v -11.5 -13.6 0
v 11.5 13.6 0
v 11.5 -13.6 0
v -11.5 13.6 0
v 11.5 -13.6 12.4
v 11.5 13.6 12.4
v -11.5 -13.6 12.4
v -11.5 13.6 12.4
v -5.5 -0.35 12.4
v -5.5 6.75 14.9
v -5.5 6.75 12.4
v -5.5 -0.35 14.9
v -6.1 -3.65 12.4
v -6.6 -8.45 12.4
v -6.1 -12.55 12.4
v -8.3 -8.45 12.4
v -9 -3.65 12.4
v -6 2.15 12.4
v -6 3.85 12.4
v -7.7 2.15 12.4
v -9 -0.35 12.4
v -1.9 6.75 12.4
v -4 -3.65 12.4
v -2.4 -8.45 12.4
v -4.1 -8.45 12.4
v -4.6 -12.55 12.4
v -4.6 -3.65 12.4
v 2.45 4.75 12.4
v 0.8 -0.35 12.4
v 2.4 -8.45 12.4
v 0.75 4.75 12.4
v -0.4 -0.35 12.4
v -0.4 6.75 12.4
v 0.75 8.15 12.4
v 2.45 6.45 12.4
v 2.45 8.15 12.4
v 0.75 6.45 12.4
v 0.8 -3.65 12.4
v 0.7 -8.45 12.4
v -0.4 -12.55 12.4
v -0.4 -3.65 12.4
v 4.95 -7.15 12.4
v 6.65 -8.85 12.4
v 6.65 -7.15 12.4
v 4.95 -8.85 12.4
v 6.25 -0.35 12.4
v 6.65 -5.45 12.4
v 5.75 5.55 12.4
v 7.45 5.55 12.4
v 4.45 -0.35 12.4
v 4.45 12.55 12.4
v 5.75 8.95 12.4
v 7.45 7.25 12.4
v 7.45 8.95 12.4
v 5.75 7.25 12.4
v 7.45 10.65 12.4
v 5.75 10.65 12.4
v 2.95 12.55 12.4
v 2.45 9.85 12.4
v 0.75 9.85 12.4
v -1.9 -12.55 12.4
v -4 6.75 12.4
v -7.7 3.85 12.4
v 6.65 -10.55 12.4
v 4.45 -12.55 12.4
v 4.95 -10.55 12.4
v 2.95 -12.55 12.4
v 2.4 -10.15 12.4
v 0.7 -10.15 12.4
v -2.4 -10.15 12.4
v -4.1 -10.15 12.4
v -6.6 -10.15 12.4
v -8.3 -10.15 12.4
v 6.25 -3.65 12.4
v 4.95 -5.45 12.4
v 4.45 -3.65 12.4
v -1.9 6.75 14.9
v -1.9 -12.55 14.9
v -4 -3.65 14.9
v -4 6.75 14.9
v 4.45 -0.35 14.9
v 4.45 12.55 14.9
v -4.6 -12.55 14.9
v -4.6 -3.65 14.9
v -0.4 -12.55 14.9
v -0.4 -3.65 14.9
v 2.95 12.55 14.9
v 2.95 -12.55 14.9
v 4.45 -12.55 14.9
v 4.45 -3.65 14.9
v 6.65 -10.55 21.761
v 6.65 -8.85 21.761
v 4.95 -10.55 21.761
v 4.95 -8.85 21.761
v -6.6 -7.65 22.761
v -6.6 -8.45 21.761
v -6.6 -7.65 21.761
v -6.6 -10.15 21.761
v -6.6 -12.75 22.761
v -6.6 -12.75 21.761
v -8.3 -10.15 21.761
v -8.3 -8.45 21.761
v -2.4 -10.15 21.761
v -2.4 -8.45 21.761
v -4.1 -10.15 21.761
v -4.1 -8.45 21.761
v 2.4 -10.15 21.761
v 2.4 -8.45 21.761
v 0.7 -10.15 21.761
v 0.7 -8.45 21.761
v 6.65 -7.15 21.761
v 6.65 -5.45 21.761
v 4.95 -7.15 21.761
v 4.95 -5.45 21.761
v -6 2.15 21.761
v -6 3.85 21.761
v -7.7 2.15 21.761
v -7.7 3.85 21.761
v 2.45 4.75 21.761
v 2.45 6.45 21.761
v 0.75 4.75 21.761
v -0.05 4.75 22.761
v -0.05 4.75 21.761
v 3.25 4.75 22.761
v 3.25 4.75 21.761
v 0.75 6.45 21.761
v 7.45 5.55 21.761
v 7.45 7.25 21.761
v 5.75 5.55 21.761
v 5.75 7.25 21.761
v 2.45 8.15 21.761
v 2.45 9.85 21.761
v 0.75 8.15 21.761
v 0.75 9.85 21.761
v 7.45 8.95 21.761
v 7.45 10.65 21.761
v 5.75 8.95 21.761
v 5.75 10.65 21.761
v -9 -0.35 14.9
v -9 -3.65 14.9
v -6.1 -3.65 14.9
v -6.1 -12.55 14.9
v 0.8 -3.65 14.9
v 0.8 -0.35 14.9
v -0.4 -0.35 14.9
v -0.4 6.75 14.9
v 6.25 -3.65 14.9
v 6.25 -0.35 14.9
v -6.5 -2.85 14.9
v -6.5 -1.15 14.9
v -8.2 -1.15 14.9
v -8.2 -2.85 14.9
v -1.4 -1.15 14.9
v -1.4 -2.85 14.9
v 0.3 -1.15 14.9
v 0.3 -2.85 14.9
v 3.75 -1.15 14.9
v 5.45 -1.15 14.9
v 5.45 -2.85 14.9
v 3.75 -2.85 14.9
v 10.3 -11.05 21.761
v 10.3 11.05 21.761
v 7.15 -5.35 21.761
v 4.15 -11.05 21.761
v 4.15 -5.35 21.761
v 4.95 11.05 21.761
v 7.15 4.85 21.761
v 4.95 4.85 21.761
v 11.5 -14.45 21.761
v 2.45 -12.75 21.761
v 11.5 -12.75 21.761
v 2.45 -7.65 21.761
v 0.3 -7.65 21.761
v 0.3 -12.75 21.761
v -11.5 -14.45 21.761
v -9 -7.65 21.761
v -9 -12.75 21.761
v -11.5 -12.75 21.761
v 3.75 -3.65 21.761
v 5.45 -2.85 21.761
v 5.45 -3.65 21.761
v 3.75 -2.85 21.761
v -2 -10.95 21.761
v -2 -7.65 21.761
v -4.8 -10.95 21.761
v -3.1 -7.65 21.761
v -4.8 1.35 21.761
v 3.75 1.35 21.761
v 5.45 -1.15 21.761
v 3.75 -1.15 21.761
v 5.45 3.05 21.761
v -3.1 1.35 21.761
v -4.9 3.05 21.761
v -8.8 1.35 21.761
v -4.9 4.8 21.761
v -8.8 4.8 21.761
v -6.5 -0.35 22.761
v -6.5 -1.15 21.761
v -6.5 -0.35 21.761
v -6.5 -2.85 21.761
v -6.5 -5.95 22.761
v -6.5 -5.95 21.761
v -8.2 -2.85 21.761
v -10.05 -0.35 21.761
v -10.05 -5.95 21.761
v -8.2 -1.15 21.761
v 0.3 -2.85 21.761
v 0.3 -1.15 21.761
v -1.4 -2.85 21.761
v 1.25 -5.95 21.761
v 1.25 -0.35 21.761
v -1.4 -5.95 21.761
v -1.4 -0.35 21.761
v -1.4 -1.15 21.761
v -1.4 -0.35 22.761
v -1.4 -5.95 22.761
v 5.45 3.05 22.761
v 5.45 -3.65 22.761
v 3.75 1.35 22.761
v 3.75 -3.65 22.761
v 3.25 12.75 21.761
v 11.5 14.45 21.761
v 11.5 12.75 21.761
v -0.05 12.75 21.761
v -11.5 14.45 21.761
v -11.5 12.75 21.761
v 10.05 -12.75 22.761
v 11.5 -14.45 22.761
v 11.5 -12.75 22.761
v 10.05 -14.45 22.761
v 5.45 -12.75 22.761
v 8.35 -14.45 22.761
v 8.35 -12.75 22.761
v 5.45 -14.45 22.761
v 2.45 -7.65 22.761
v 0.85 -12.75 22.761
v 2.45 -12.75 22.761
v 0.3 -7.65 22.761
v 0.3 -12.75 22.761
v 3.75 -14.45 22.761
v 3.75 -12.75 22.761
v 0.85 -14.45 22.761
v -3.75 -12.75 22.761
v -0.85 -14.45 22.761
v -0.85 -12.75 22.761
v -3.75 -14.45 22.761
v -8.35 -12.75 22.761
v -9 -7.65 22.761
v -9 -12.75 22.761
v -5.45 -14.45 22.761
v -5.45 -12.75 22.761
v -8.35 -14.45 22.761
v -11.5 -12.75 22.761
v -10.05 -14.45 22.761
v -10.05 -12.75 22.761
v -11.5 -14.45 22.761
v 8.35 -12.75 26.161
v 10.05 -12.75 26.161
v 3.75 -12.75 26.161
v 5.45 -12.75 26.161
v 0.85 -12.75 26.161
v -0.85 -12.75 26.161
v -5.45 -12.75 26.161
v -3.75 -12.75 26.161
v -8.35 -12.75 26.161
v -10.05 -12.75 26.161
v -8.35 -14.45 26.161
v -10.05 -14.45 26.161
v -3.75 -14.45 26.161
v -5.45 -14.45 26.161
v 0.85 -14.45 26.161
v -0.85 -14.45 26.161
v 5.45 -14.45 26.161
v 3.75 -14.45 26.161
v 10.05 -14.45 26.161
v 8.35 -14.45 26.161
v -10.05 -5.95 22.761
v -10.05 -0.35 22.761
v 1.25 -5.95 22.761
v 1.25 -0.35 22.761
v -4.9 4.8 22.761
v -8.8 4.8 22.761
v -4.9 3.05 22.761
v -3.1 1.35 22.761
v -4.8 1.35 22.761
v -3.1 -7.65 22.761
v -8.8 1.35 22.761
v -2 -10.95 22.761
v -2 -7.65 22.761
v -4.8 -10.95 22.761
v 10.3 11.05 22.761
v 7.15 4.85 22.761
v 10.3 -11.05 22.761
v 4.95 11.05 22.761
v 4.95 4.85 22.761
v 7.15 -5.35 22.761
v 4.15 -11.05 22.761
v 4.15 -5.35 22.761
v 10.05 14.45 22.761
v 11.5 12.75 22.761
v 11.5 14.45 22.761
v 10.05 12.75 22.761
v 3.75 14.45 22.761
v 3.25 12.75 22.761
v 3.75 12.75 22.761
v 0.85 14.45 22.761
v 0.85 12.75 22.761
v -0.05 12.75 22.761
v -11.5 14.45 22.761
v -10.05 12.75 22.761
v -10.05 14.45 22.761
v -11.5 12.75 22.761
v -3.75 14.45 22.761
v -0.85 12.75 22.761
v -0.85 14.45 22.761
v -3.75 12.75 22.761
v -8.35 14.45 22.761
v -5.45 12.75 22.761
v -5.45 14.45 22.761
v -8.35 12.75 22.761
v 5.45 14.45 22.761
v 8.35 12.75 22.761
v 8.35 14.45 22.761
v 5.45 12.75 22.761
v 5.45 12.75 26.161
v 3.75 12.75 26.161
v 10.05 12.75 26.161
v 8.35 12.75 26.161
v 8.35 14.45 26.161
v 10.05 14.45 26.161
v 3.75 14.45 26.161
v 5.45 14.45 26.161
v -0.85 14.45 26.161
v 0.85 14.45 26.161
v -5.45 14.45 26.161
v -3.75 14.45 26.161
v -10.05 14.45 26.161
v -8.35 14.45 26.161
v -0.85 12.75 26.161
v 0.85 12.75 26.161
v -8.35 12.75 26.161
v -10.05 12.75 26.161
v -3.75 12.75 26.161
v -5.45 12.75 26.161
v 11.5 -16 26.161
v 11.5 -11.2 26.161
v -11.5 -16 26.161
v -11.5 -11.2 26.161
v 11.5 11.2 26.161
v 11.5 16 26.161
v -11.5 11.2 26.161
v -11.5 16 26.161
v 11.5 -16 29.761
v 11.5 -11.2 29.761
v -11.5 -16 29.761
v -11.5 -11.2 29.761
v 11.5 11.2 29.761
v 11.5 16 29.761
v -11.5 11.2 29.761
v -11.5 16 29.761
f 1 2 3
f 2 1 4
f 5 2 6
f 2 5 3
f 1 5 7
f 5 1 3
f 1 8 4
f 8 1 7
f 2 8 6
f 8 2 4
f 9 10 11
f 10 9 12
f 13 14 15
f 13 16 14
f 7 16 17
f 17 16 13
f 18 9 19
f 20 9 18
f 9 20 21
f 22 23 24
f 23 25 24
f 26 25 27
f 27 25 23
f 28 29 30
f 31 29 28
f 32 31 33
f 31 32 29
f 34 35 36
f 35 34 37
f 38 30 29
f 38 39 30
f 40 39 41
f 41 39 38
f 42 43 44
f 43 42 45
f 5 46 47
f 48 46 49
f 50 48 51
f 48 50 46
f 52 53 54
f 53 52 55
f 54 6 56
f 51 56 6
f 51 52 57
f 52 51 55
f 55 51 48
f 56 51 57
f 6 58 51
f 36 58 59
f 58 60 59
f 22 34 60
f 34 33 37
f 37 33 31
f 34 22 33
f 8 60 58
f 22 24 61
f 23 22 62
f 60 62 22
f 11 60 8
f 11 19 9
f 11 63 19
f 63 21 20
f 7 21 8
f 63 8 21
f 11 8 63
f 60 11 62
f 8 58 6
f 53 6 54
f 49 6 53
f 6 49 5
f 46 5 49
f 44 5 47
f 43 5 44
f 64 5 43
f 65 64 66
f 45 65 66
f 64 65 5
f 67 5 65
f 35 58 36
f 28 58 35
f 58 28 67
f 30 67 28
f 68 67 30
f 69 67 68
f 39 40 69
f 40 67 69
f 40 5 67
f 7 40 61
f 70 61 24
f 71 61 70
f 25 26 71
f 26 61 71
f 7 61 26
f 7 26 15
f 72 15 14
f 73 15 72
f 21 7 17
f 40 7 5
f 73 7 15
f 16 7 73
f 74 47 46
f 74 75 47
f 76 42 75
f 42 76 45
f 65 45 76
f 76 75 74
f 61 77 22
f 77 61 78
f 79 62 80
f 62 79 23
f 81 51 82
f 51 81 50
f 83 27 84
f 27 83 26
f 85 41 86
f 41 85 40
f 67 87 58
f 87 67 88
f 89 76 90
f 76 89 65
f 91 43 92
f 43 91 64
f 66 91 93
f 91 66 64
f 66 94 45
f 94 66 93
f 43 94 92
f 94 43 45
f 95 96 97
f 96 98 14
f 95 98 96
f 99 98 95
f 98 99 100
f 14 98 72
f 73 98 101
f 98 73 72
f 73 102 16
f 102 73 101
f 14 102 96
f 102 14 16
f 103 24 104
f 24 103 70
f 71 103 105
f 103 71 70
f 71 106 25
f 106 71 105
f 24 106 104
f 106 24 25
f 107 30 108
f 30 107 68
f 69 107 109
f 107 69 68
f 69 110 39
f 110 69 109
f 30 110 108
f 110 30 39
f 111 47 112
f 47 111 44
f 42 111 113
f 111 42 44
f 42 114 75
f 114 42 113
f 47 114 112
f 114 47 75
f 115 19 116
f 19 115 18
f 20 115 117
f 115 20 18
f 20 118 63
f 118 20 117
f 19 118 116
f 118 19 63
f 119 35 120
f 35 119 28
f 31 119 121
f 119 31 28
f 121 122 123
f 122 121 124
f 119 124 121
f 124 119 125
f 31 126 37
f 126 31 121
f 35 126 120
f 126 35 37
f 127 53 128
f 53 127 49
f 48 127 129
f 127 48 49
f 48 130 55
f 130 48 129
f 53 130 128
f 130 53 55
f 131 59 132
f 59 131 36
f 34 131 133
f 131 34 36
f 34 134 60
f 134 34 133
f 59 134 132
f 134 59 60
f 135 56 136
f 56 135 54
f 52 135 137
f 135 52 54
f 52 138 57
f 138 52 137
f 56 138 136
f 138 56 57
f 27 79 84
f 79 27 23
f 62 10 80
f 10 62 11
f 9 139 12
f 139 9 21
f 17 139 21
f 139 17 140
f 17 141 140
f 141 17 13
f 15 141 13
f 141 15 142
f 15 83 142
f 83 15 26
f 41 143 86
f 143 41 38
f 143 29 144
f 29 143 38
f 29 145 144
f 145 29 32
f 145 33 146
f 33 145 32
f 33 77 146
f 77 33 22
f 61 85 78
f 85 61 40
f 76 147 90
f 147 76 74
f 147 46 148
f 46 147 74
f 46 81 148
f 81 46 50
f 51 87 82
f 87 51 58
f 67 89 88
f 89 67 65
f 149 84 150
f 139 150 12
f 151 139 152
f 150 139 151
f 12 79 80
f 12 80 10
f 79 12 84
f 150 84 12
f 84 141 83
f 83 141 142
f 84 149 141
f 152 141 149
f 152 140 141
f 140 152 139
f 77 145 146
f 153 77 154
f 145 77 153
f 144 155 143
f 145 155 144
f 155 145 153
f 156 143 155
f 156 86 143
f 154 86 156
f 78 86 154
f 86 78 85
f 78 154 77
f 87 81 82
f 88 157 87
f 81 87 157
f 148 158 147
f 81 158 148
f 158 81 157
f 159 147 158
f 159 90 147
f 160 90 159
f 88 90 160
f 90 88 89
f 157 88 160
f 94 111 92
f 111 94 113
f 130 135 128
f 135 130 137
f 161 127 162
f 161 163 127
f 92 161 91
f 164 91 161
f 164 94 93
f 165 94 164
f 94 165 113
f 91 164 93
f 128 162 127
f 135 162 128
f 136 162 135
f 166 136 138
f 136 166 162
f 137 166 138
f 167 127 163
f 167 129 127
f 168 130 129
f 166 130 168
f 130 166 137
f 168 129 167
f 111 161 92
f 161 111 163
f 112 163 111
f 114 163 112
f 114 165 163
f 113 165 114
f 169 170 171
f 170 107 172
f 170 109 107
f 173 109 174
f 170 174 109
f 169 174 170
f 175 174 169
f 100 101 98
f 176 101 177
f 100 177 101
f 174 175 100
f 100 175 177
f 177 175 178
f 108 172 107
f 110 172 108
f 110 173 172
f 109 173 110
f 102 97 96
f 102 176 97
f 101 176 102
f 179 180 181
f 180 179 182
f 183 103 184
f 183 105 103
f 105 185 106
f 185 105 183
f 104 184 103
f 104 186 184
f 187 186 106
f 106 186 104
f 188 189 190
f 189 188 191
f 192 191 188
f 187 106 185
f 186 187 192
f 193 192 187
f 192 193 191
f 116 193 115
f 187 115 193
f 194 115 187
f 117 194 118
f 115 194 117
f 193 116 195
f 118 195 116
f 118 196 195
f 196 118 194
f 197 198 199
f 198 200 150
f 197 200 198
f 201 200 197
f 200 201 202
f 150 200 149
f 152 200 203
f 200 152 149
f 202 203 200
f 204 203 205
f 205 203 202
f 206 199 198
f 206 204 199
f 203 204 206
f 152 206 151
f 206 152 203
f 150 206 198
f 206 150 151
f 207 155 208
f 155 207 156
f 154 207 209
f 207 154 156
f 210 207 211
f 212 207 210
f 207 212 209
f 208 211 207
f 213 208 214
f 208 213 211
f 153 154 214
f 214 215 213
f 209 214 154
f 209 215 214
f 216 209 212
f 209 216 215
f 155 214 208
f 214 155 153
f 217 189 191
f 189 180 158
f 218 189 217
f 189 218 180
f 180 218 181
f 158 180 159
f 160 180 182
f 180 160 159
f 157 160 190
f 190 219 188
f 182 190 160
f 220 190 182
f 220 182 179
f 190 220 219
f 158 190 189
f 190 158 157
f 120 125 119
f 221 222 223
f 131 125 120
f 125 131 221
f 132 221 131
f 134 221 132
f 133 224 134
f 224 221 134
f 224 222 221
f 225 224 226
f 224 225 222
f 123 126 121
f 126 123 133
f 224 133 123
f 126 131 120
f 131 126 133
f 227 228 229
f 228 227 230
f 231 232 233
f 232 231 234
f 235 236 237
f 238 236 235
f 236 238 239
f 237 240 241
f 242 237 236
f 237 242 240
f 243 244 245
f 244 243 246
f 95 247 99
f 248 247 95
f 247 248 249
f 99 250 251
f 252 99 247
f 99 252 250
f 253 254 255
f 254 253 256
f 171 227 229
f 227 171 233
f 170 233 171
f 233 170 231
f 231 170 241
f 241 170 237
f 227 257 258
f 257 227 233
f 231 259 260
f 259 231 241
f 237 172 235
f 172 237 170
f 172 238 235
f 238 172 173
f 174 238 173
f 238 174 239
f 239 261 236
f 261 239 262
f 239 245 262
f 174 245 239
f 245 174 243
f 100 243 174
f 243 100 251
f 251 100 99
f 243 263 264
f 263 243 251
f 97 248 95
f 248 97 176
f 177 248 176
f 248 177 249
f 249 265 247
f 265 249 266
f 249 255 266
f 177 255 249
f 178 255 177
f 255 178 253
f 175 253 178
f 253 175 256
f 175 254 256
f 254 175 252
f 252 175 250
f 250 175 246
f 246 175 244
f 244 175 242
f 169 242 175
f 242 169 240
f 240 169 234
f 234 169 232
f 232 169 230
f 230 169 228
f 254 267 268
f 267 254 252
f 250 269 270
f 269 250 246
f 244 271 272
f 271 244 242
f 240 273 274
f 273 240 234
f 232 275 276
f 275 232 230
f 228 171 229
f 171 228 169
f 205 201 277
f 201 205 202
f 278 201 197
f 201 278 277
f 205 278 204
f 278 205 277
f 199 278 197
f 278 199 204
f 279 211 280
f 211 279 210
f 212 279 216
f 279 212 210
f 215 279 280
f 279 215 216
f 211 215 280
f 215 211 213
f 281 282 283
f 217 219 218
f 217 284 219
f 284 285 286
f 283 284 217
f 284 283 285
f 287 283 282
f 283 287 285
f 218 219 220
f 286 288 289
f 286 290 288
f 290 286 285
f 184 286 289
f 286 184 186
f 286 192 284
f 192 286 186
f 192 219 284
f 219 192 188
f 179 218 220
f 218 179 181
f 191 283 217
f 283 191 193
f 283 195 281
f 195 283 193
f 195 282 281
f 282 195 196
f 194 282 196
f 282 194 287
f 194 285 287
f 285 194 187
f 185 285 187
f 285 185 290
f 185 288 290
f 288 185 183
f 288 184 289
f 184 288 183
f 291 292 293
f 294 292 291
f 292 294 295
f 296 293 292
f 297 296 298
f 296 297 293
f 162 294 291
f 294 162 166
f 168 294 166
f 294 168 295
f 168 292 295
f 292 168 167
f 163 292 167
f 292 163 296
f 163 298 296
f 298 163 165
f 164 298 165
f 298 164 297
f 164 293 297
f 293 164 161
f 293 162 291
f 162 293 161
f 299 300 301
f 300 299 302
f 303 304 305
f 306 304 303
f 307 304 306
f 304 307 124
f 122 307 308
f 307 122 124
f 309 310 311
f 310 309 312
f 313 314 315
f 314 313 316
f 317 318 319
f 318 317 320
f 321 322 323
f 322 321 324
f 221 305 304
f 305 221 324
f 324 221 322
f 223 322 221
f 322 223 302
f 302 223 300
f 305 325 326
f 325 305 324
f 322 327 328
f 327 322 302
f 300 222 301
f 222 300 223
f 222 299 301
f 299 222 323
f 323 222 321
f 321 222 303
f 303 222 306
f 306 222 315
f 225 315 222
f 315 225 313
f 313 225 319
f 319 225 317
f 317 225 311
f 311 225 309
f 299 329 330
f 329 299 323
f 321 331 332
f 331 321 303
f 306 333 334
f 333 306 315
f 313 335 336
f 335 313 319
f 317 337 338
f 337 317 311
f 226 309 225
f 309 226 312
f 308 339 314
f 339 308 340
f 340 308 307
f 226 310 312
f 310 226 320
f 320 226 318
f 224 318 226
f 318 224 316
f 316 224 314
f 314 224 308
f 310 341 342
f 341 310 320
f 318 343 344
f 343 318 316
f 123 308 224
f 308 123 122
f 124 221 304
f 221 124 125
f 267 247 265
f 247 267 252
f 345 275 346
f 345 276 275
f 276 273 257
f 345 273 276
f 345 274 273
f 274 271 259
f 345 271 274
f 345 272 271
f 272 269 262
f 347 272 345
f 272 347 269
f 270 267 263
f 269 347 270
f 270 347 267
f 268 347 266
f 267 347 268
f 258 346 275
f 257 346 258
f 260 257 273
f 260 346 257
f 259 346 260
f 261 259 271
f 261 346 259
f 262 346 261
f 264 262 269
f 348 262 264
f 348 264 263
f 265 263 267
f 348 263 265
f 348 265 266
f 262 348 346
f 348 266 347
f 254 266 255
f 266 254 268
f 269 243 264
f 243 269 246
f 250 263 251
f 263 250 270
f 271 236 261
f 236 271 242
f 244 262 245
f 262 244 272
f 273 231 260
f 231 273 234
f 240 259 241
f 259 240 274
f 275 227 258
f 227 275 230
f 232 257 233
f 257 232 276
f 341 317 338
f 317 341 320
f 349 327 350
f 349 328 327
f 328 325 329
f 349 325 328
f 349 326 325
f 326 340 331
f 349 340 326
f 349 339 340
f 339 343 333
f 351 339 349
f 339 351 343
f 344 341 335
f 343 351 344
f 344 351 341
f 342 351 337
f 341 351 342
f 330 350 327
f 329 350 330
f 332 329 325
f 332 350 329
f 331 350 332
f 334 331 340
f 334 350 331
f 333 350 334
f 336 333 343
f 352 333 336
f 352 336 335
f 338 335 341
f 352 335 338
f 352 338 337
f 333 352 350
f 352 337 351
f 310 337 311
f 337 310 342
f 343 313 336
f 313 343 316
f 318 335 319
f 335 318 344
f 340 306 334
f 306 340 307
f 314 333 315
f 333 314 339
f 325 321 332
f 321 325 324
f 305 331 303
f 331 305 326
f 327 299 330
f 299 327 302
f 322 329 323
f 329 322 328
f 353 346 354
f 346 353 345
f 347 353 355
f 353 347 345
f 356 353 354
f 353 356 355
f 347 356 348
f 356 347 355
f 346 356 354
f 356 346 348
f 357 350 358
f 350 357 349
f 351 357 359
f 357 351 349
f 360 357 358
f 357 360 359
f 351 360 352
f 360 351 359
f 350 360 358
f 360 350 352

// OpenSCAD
// Generated by SolidPython 0.4.2 on 2020-09-29 23:21:08
//!OpenSCAD

scale(v = 0.0100000000) {
	translate(v = [-1150, -1360, 0]) {
		union() {
			color(c = [0.4000000000, 0.4000000000, 0.4000000000]) {
				translate(v = [0, 0, 0]) {
					linear_extrude(height = 1000.0000000000) {
						polygon(paths = [[0, 1, 2, 3]], points = [[0, 0], [0, 2720], [2300, 2720], [2300, 0]]);
					}
				}
			}
			color(c = [0.2000000000, 0.6000000000, 0.2000000000]) {
				translate(v = [0, 0, 1000.0000000000]) {
					linear_extrude(height = 120.0000000000) {
						polygon(paths = [[0, 1, 2, 3]], points = [[0, 1305], [0, 2720], [2300, 2720], [2300, 1305]]);
					}
				}
			}
			color(c = [0.4000000000, 0.4000000000, 0.4000000000]) {
				translate(v = [0, 0, 1000.0000000000]) {
					linear_extrude(height = 120.0000000000) {
						polygon(paths = [[0, 1, 2, 3]], points = [[0, 0], [0, 1305], [2300, 1305], [2300, 0]]);
					}
				}
			}
			color(c = [0.9000000000, 0.6000000000, 0.6000000000]) {
				translate(v = [0, 0, 1120.0000000000]) {
					linear_extrude(height = 120.0000000000) {
						polygon(paths = [[0, 1, 2, 3]], points = [[340, 1485], [340, 1905], [600, 1905], [600, 1485]]);
					}
				}
			}
			color(c = [0.9000000000, 0.6000000000, 0.6000000000]) {
				translate(v = [0, 0, 1120.0000000000]) {
					linear_extrude(height = 120.0000000000) {
						polygon(paths = [[0, 1, 2, 3]], points = [[750, 1485], [750, 1905], [960, 1905], [960, 1485]]);
					}
				}
			}
			color(c = [0.9000000000, 0.6000000000, 0.6000000000]) {
				translate(v = [0, 0, 1120.0000000000]) {
					linear_extrude(height = 120.0000000000) {
						polygon(paths = [[0, 1, 2, 3, 4, 5]], points = [[1110, 1485], [1110, 1905], [1185, 1905], [1185, 2485], [1445, 2485], [1445, 1485]]);
					}
				}
			}
			color(c = [0.9000000000, 0.6000000000, 0.6000000000]) {
				translate(v = [0, 0, 1120.0000000000]) {
					linear_extrude(height = 120.0000000000) {
						polygon(paths = [[0, 1, 2, 3]], points = [[1595, 1485], [1595, 2485], [1935, 2485], [1935, 1485]]);
					}
				}
			}
			color(c = [0.9000000000, 0.6000000000, 0.9000000000]) {
				translate(v = [0, 0, 1120.0000000000]) {
					linear_extrude(height = 120.0000000000) {
						polygon(paths = [[0, 1, 2, 3]], points = [[280, 235], [280, 655], [540, 655], [540, 235]]);
					}
				}
			}
			color(c = [0.9000000000, 0.6000000000, 0.9000000000]) {
				translate(v = [0, 0, 1120.0000000000]) {
					linear_extrude(height = 120.0000000000) {
						polygon(paths = [[0, 1, 2, 3]], points = [[690, 235], [690, 655], [960, 655], [960, 235]]);
					}
				}
			}
			color(c = [0.9000000000, 0.6000000000, 0.9000000000]) {
				translate(v = [0, 0, 1120.0000000000]) {
					linear_extrude(height = 120.0000000000) {
						polygon(paths = [[0, 1, 2, 3, 4, 5]], points = [[1110, 235], [1110, 655], [1185, 655], [1185, 885], [1445, 885], [1445, 235]]);
					}
				}
			}
			color(c = [0.9000000000, 0.6000000000, 0.9000000000]) {
				translate(v = [0, 0, 1120.0000000000]) {
					linear_extrude(height = 120.0000000000) {
						polygon(paths = [[0, 1, 2, 3]], points = [[1595, 235], [1595, 885], [1855, 885], [1855, 235]]);
					}
				}
			}
			color(c = [0.2000000000, 0.6000000000, 0.2000000000]) {
				translate(v = [0, 0, 1120.0000000000]) {
					linear_extrude(height = 120.0000000000) {
						difference() {
							polygon(paths = [[0, 1, 2, 3]], points = [[0, 1305], [0, 2720], [2300, 2720], [2300, 1305]]);
							polygon(paths = [[0, 1, 2, 3]], points = [[340, 1485], [600, 1485], [600, 1905], [340, 1905]]);
							polygon(paths = [[0, 1, 2, 3]], points = [[750, 1485], [960, 1485], [960, 1905], [750, 1905]]);
							polygon(paths = [[0, 1, 2, 3]], points = [[1595, 1485], [1935, 1485], [1935, 2485], [1595, 2485]]);
							polygon(paths = [[0, 1, 2, 3, 4, 5]], points = [[1110, 1485], [1445, 1485], [1445, 2485], [1185, 2485], [1185, 1905], [1110, 1905]]);
						}
					}
				}
			}
			color(c = [0.4000000000, 0.4000000000, 0.4000000000]) {
				translate(v = [0, 0, 1120.0000000000]) {
					linear_extrude(height = 120.0000000000) {
						difference() {
							polygon(paths = [[0, 1, 2, 3]], points = [[0, 0], [0, 1305], [2300, 1305], [2300, 0]]);
							polygon(paths = [[0, 1, 2, 3]], points = [[280, 235], [540, 235], [540, 655], [280, 655]]);
							polygon(paths = [[0, 1, 2, 3]], points = [[690, 235], [960, 235], [960, 655], [690, 655]]);
							polygon(paths = [[0, 1, 2, 3]], points = [[1595, 235], [1855, 235], [1855, 885], [1595, 885]]);
							polygon(paths = [[0, 1, 2, 3, 4, 5]], points = [[1110, 235], [1445, 235], [1445, 885], [1185, 885], [1185, 655], [1110, 655]]);
						}
					}
				}
			}
			color(c = [0.1000000000, 0.1000000000, 0.1000000000]) {
				translate(v = [0, 0, 1240.0000000000]) {
					linear_extrude(height = 70.0000000000) {
						polygon(paths = [[0, 1, 2, 3]], points = [[1645, 305], [1645, 475], [1815, 475], [1815, 305]]);
					}
				}
			}
			color(c = [0.1000000000, 0.1000000000, 0.1000000000]) {
				translate(v = [0, 0, 1240.0000000000]) {
					linear_extrude(height = 70.0000000000) {
						polygon(paths = [[0, 1, 2, 3]], points = [[320, 345], [320, 515], [490, 515], [490, 345]]);
					}
				}
			}
			color(c = [0.1000000000, 0.1000000000, 0.1000000000]) {
				translate(v = [0, 0, 1240.0000000000]) {
					linear_extrude(height = 70.0000000000) {
						polygon(paths = [[0, 1, 2, 3]], points = [[740, 345], [740, 515], [910, 515], [910, 345]]);
					}
				}
			}
			color(c = [0.1000000000, 0.1000000000, 0.1000000000]) {
				translate(v = [0, 0, 1240.0000000000]) {
					linear_extrude(height = 70.0000000000) {
						polygon(paths = [[0, 1, 2, 3]], points = [[1220, 345], [1220, 515], [1390, 515], [1390, 345]]);
					}
				}
			}
			color(c = [0.1000000000, 0.1000000000, 0.1000000000]) {
				translate(v = [0, 0, 1240.0000000000]) {
					linear_extrude(height = 70.0000000000) {
						polygon(paths = [[0, 1, 2, 3]], points = [[1645, 645], [1645, 815], [1815, 815], [1815, 645]]);
					}
				}
			}
			color(c = [0.1000000000, 0.1000000000, 0.1000000000]) {
				translate(v = [0, 0, 1240.0000000000]) {
					linear_extrude(height = 70.0000000000) {
						polygon(paths = [[0, 1, 2, 3]], points = [[380, 1575], [380, 1745], [550, 1745], [550, 1575]]);
					}
				}
			}
			color(c = [0.1000000000, 0.1000000000, 0.1000000000]) {
				translate(v = [0, 0, 1240.0000000000]) {
					linear_extrude(height = 70.0000000000) {
						polygon(paths = [[0, 1, 2, 3]], points = [[1225, 1835], [1225, 2005], [1395, 2005], [1395, 1835]]);
					}
				}
			}
			color(c = [0.1000000000, 0.1000000000, 0.1000000000]) {
				translate(v = [0, 0, 1240.0000000000]) {
					linear_extrude(height = 70.0000000000) {
						polygon(paths = [[0, 1, 2, 3]], points = [[1725, 1915], [1725, 2085], [1895, 2085], [1895, 1915]]);
					}
				}
			}
			color(c = [0.1000000000, 0.1000000000, 0.1000000000]) {
				translate(v = [0, 0, 1240.0000000000]) {
					linear_extrude(height = 70.0000000000) {
						polygon(paths = [[0, 1, 2, 3]], points = [[1225, 2175], [1225, 2345], [1395, 2345], [1395, 2175]]);
					}
				}
			}
			color(c = [0.1000000000, 0.1000000000, 0.1000000000]) {
				translate(v = [0, 0, 1240.0000000000]) {
					linear_extrude(height = 70.0000000000) {
						polygon(paths = [[0, 1, 2, 3]], points = [[1725, 2255], [1725, 2425], [1895, 2425], [1895, 2255]]);
					}
				}
			}
			color(c = [1.0000000000, 1.0000000000, 1.0000000000]) {
				translate(v = [0, 0, 1240.0000000000]) {
					linear_extrude(height = 70.0000000000) {
						polygon(paths = [[0, 1, 2, 3, 4, 5, 6, 7, 8, 9]], points = [[540, 105], [540, 995], [250, 995], [250, 1325], [600, 1325], [600, 2035], [750, 2035], [750, 995], [690, 995], [690, 105]]);
					}
				}
			}
			color(c = [1.0000000000, 1.0000000000, 1.0000000000]) {
				translate(v = [0, 0, 1240.0000000000]) {
					linear_extrude(height = 70.0000000000) {
						polygon(paths = [[0, 1, 2, 3, 4, 5, 6, 7]], points = [[960, 105], [960, 2035], [1110, 2035], [1110, 1325], [1230, 1325], [1230, 995], [1110, 995], [1110, 105]]);
					}
				}
			}
			color(c = [1.0000000000, 1.0000000000, 1.0000000000]) {
				translate(v = [0, 0, 1240.0000000000]) {
					linear_extrude(height = 70.0000000000) {
						polygon(paths = [[0, 1, 2, 3, 4, 5, 6, 7]], points = [[1445, 105], [1445, 2615], [1595, 2615], [1595, 1325], [1775, 1325], [1775, 995], [1595, 995], [1595, 105]]);
					}
				}
			}
			color(c = [0.1000000000, 0.1000000000, 0.1000000000]) {
				translate(v = [0, 0, 1310.0000000000]) {
					linear_extrude(height = 180.0000000000) {
						polygon(paths = [[0, 1, 2, 3]], points = [[1645, 305], [1645, 475], [1815, 475], [1815, 305]]);
					}
				}
			}
			color(c = [0.1000000000, 0.1000000000, 0.1000000000]) {
				translate(v = [0, 0, 1310.0000000000]) {
					linear_extrude(height = 180.0000000000) {
						polygon(paths = [[0, 1, 2, 3]], points = [[320, 345], [320, 515], [490, 515], [490, 345]]);
					}
				}
			}
			color(c = [0.1000000000, 0.1000000000, 0.1000000000]) {
				translate(v = [0, 0, 1310.0000000000]) {
					linear_extrude(height = 180.0000000000) {
						polygon(paths = [[0, 1, 2, 3]], points = [[740, 345], [740, 515], [910, 515], [910, 345]]);
					}
				}
			}
			color(c = [0.1000000000, 0.1000000000, 0.1000000000]) {
				translate(v = [0, 0, 1310.0000000000]) {
					linear_extrude(height = 180.0000000000) {
						polygon(paths = [[0, 1, 2, 3]], points = [[1220, 345], [1220, 515], [1390, 515], [1390, 345]]);
					}
				}
			}
			color(c = [0.1000000000, 0.1000000000, 0.1000000000]) {
				translate(v = [0, 0, 1310.0000000000]) {
					linear_extrude(height = 180.0000000000) {
						polygon(paths = [[0, 1, 2, 3]], points = [[1645, 645], [1645, 815], [1815, 815], [1815, 645]]);
					}
				}
			}
			color(c = [0.1000000000, 0.1000000000, 0.1000000000]) {
				translate(v = [0, 0, 1310.0000000000]) {
					linear_extrude(height = 180.0000000000) {
						polygon(paths = [[0, 1, 2, 3]], points = [[380, 1575], [380, 1745], [550, 1745], [550, 1575]]);
					}
				}
			}
			color(c = [0.1000000000, 0.1000000000, 0.1000000000]) {
				translate(v = [0, 0, 1310.0000000000]) {
					linear_extrude(height = 180.0000000000) {
						polygon(paths = [[0, 1, 2, 3]], points = [[1225, 1835], [1225, 2005], [1395, 2005], [1395, 1835]]);
					}
				}
			}
			color(c = [0.1000000000, 0.1000000000, 0.1000000000]) {
				translate(v = [0, 0, 1310.0000000000]) {
					linear_extrude(height = 180.0000000000) {
						polygon(paths = [[0, 1, 2, 3]], points = [[1725, 1915], [1725, 2085], [1895, 2085], [1895, 1915]]);
					}
				}
			}
			color(c = [0.1000000000, 0.1000000000, 0.1000000000]) {
				translate(v = [0, 0, 1310.0000000000]) {
					linear_extrude(height = 180.0000000000) {
						polygon(paths = [[0, 1, 2, 3]], points = [[1225, 2175], [1225, 2345], [1395, 2345], [1395, 2175]]);
					}
				}
			}
			color(c = [0.1000000000, 0.1000000000, 0.1000000000]) {
				translate(v = [0, 0, 1310.0000000000]) {
					linear_extrude(height = 180.0000000000) {
						polygon(paths = [[0, 1, 2, 3]], points = [[1725, 2255], [1725, 2425], [1895, 2425], [1895, 2255]]);
					}
				}
			}
			color(c = [0.7000000000, 0, 0]) {
				translate(v = [0, 0, 1310.0000000000]) {
					linear_extrude(height = 180.0000000000) {
						polygon(paths = [[0, 1, 2, 3, 4, 5, 6, 7, 8, 9]], points = [[540, 105], [540, 995], [250, 995], [250, 1325], [600, 1325], [600, 2035], [750, 2035], [750, 995], [690, 995], [690, 105]]);
					}
				}
			}
			color(c = [0.7000000000, 0, 0]) {
				translate(v = [0, 0, 1310.0000000000]) {
					linear_extrude(height = 180.0000000000) {
						polygon(paths = [[0, 1, 2, 3, 4, 5, 6, 7]], points = [[960, 105], [960, 2035], [1110, 2035], [1110, 1325], [1230, 1325], [1230, 995], [1110, 995], [1110, 105]]);
					}
				}
			}
			color(c = [0.7000000000, 0, 0]) {
				translate(v = [0, 0, 1310.0000000000]) {
					linear_extrude(height = 180.0000000000) {
						polygon(paths = [[0, 1, 2, 3, 4, 5, 6, 7]], points = [[1445, 105], [1445, 2615], [1595, 2615], [1595, 1325], [1775, 1325], [1775, 995], [1595, 995], [1595, 105]]);
					}
				}
			}
			color(c = [0.1000000000, 0.1000000000, 0.1000000000]) {
				translate(v = [0, 0, 1490.0000000000]) {
					linear_extrude(height = 686.1000000000) {
						polygon(paths = [[0, 1, 2, 3]], points = [[1645, 305], [1645, 475], [1815, 475], [1815, 305]]);
					}
				}
			}
			color(c = [0.1000000000, 0.1000000000, 0.1000000000]) {
				translate(v = [0, 0, 1490.0000000000]) {
					linear_extrude(height = 686.1000000000) {
						polygon(paths = [[0, 1, 2, 3]], points = [[320, 345], [320, 515], [490, 515], [490, 345]]);
					}
				}
			}
			color(c = [0.1000000000, 0.1000000000, 0.1000000000]) {
				translate(v = [0, 0, 1490.0000000000]) {
					linear_extrude(height = 686.1000000000) {
						polygon(paths = [[0, 1, 2, 3]], points = [[740, 345], [740, 515], [910, 515], [910, 345]]);
					}
				}
			}
			color(c = [0.1000000000, 0.1000000000, 0.1000000000]) {
				translate(v = [0, 0, 1490.0000000000]) {
					linear_extrude(height = 686.1000000000) {
						polygon(paths = [[0, 1, 2, 3]], points = [[1220, 345], [1220, 515], [1390, 515], [1390, 345]]);
					}
				}
			}
			color(c = [0.1000000000, 0.1000000000, 0.1000000000]) {
				translate(v = [0, 0, 1490.0000000000]) {
					linear_extrude(height = 686.1000000000) {
						polygon(paths = [[0, 1, 2, 3]], points = [[1645, 645], [1645, 815], [1815, 815], [1815, 645]]);
					}
				}
			}
			color(c = [0.1000000000, 0.1000000000, 0.1000000000]) {
				translate(v = [0, 0, 1490.0000000000]) {
					linear_extrude(height = 686.1000000000) {
						polygon(paths = [[0, 1, 2, 3]], points = [[330, 1075], [330, 1245], [500, 1245], [500, 1075]]);
					}
				}
			}
			color(c = [0.1000000000, 0.1000000000, 0.1000000000]) {
				translate(v = [0, 0, 1490.0000000000]) {
					linear_extrude(height = 686.1000000000) {
						polygon(paths = [[0, 1, 2, 3]], points = [[1010, 1075], [1010, 1245], [1180, 1245], [1180, 1075]]);
					}
				}
			}
			color(c = [0.1000000000, 0.1000000000, 0.1000000000]) {
				translate(v = [0, 0, 1490.0000000000]) {
					linear_extrude(height = 686.1000000000) {
						polygon(paths = [[0, 1, 2, 3]], points = [[1525, 1075], [1525, 1245], [1695, 1245], [1695, 1075]]);
					}
				}
			}
			color(c = [0.1000000000, 0.1000000000, 0.1000000000]) {
				translate(v = [0, 0, 1490.0000000000]) {
					linear_extrude(height = 686.1000000000) {
						polygon(paths = [[0, 1, 2, 3]], points = [[380, 1575], [380, 1745], [550, 1745], [550, 1575]]);
					}
				}
			}
			color(c = [0.1000000000, 0.1000000000, 0.1000000000]) {
				translate(v = [0, 0, 1490.0000000000]) {
					linear_extrude(height = 686.1000000000) {
						polygon(paths = [[0, 1, 2, 3]], points = [[1225, 1835], [1225, 2005], [1395, 2005], [1395, 1835]]);
					}
				}
			}
			color(c = [0.1000000000, 0.1000000000, 0.1000000000]) {
				translate(v = [0, 0, 1490.0000000000]) {
					linear_extrude(height = 686.1000000000) {
						polygon(paths = [[0, 1, 2, 3]], points = [[1725, 1915], [1725, 2085], [1895, 2085], [1895, 1915]]);
					}
				}
			}
			color(c = [0.1000000000, 0.1000000000, 0.1000000000]) {
				translate(v = [0, 0, 1490.0000000000]) {
					linear_extrude(height = 686.1000000000) {
						polygon(paths = [[0, 1, 2, 3]], points = [[1225, 2175], [1225, 2345], [1395, 2345], [1395, 2175]]);
					}
				}
			}
			color(c = [0.1000000000, 0.1000000000, 0.1000000000]) {
				translate(v = [0, 0, 1490.0000000000]) {
					linear_extrude(height = 686.1000000000) {
						polygon(paths = [[0, 1, 2, 3]], points = [[1725, 2255], [1725, 2425], [1895, 2425], [1895, 2255]]);
					}
				}
			}
			color(c = [0.9000000000, 0.6000000000, 0.6000000000]) {
				translate(v = [0, 0, 2176.1000000000]) {
					linear_extrude(height = 100.0000000000) {
						polygon(paths = [[0, 1, 2, 3, 4, 5, 6, 7, 8, 9, 10, 11]], points = [[0, -85], [0, 85], [250, 85], [250, 595], [490, 595], [490, 85], [1180, 85], [1180, 595], [1395, 595], [1395, 85], [2300, 85], [2300, -85]]);
					}
				}
			}
			color(c = [0.9000000000, 0.6000000000, 0.6000000000]) {
				translate(v = [0, 0, 2176.1000000000]) {
					linear_extrude(height = 100.0000000000) {
						polygon(paths = [[0, 1, 2, 3]], points = [[145, 765], [145, 1325], [500, 1325], [500, 765]]);
					}
				}
			}
			color(c = [0.9000000000, 0.6000000000, 0.6000000000]) {
				translate(v = [0, 0, 2176.1000000000]) {
					linear_extrude(height = 100.0000000000) {
						polygon(paths = [[0, 1, 2, 3]], points = [[1010, 765], [1010, 1325], [1275, 1325], [1275, 765]]);
					}
				}
			}
			color(c = [0.9000000000, 0.6000000000, 0.6000000000]) {
				translate(v = [0, 0, 2176.1000000000]) {
					linear_extrude(height = 100.0000000000) {
						polygon(paths = [[0, 1, 2, 3, 4, 5, 6, 7, 8, 9, 10, 11, 12, 13]], points = [[670, 265], [670, 1495], [270, 1495], [270, 1840], [660, 1840], [660, 1665], [1695, 1665], [1695, 995], [1525, 995], [1525, 1495], [840, 1495], [840, 595], [950, 595], [950, 265]]);
					}
				}
			}
			color(c = [0.9000000000, 0.6000000000, 0.6000000000]) {
				translate(v = [0, 0, 2176.1000000000]) {
					linear_extrude(height = 100.0000000000) {
						polygon(paths = [[0, 1, 2, 3, 4, 5, 6, 7]], points = [[1565, 255], [1565, 825], [1865, 825], [1865, 1845], [1645, 1845], [1645, 2465], [2180, 2465], [2180, 255]]);
					}
				}
			}
			color(c = [0.9000000000, 0.6000000000, 0.6000000000]) {
				translate(v = [0, 0, 2176.1000000000]) {
					linear_extrude(height = 100.0000000000) {
						polygon(paths = [[0, 1, 2, 3, 4, 5, 6, 7]], points = [[1145, 1835], [1145, 2635], [0, 2635], [0, 2805], [2300, 2805], [2300, 2635], [1475, 2635], [1475, 1835]]);
					}
				}
			}
			color(c = [0.5000000000, 0.5000000000, 0.5000000000]) {
				translate(v = [0, 0, 2276.1000000000]) {
					linear_extrude(height = 340.0000000000) {
						polygon(paths = [[0, 1, 2, 3]], points = [[145, -85], [145, 85], [315, 85], [315, -85]]);
					}
				}
			}
			color(c = [0.5000000000, 0.5000000000, 0.5000000000]) {
				translate(v = [0, 0, 2276.1000000000]) {
					linear_extrude(height = 340.0000000000) {
						polygon(paths = [[0, 1, 2, 3]], points = [[605, -85], [605, 85], [775, 85], [775, -85]]);
					}
				}
			}
			color(c = [0.5000000000, 0.5000000000, 0.5000000000]) {
				translate(v = [0, 0, 2276.1000000000]) {
					linear_extrude(height = 340.0000000000) {
						polygon(paths = [[0, 1, 2, 3]], points = [[1065, -85], [1065, 85], [1235, 85], [1235, -85]]);
					}
				}
			}
			color(c = [0.5000000000, 0.5000000000, 0.5000000000]) {
				translate(v = [0, 0, 2276.1000000000]) {
					linear_extrude(height = 340.0000000000) {
						polygon(paths = [[0, 1, 2, 3]], points = [[1525, -85], [1525, 85], [1695, 85], [1695, -85]]);
					}
				}
			}
			color(c = [0.5000000000, 0.5000000000, 0.5000000000]) {
				translate(v = [0, 0, 2276.1000000000]) {
					linear_extrude(height = 340.0000000000) {
						polygon(paths = [[0, 1, 2, 3]], points = [[1985, -85], [1985, 85], [2155, 85], [2155, -85]]);
					}
				}
			}
			color(c = [0.5000000000, 0.5000000000, 0.5000000000]) {
				translate(v = [0, 0, 2276.1000000000]) {
					linear_extrude(height = 340.0000000000) {
						polygon(paths = [[0, 1, 2, 3]], points = [[145, 2635], [145, 2805], [315, 2805], [315, 2635]]);
					}
				}
			}
			color(c = [0.5000000000, 0.5000000000, 0.5000000000]) {
				translate(v = [0, 0, 2276.1000000000]) {
					linear_extrude(height = 340.0000000000) {
						polygon(paths = [[0, 1, 2, 3]], points = [[605, 2635], [605, 2805], [775, 2805], [775, 2635]]);
					}
				}
			}
			color(c = [0.5000000000, 0.5000000000, 0.5000000000]) {
				translate(v = [0, 0, 2276.1000000000]) {
					linear_extrude(height = 340.0000000000) {
						polygon(paths = [[0, 1, 2, 3]], points = [[1065, 2635], [1065, 2805], [1235, 2805], [1235, 2635]]);
					}
				}
			}
			color(c = [0.5000000000, 0.5000000000, 0.5000000000]) {
				translate(v = [0, 0, 2276.1000000000]) {
					linear_extrude(height = 340.0000000000) {
						polygon(paths = [[0, 1, 2, 3]], points = [[1525, 2635], [1525, 2805], [1695, 2805], [1695, 2635]]);
					}
				}
			}
			color(c = [0.5000000000, 0.5000000000, 0.5000000000]) {
				translate(v = [0, 0, 2276.1000000000]) {
					linear_extrude(height = 340.0000000000) {
						polygon(paths = [[0, 1, 2, 3]], points = [[1985, 2635], [1985, 2805], [2155, 2805], [2155, 2635]]);
					}
				}
			}
			color(c = [0.3000000000, 0.3000000000, 1]) {
				translate(v = [0, 0, 2616.1000000000]) {
					linear_extrude(height = 360.0000000000) {
						polygon(paths = [[0, 1, 2, 3]], points = [[0, -240], [0, 240], [2300, 240], [2300, -240]]);
					}
				}
			}
			color(c = [0.3000000000, 0.3000000000, 1]) {
				translate(v = [0, 0, 2616.1000000000]) {
					linear_extrude(height = 360.0000000000) {
						polygon(paths = [[0, 1, 2, 3]], points = [[0, 2480], [0, 2960], [2300, 2960], [2300, 2480]]);
					}
				}
			}
		}
	}
}
